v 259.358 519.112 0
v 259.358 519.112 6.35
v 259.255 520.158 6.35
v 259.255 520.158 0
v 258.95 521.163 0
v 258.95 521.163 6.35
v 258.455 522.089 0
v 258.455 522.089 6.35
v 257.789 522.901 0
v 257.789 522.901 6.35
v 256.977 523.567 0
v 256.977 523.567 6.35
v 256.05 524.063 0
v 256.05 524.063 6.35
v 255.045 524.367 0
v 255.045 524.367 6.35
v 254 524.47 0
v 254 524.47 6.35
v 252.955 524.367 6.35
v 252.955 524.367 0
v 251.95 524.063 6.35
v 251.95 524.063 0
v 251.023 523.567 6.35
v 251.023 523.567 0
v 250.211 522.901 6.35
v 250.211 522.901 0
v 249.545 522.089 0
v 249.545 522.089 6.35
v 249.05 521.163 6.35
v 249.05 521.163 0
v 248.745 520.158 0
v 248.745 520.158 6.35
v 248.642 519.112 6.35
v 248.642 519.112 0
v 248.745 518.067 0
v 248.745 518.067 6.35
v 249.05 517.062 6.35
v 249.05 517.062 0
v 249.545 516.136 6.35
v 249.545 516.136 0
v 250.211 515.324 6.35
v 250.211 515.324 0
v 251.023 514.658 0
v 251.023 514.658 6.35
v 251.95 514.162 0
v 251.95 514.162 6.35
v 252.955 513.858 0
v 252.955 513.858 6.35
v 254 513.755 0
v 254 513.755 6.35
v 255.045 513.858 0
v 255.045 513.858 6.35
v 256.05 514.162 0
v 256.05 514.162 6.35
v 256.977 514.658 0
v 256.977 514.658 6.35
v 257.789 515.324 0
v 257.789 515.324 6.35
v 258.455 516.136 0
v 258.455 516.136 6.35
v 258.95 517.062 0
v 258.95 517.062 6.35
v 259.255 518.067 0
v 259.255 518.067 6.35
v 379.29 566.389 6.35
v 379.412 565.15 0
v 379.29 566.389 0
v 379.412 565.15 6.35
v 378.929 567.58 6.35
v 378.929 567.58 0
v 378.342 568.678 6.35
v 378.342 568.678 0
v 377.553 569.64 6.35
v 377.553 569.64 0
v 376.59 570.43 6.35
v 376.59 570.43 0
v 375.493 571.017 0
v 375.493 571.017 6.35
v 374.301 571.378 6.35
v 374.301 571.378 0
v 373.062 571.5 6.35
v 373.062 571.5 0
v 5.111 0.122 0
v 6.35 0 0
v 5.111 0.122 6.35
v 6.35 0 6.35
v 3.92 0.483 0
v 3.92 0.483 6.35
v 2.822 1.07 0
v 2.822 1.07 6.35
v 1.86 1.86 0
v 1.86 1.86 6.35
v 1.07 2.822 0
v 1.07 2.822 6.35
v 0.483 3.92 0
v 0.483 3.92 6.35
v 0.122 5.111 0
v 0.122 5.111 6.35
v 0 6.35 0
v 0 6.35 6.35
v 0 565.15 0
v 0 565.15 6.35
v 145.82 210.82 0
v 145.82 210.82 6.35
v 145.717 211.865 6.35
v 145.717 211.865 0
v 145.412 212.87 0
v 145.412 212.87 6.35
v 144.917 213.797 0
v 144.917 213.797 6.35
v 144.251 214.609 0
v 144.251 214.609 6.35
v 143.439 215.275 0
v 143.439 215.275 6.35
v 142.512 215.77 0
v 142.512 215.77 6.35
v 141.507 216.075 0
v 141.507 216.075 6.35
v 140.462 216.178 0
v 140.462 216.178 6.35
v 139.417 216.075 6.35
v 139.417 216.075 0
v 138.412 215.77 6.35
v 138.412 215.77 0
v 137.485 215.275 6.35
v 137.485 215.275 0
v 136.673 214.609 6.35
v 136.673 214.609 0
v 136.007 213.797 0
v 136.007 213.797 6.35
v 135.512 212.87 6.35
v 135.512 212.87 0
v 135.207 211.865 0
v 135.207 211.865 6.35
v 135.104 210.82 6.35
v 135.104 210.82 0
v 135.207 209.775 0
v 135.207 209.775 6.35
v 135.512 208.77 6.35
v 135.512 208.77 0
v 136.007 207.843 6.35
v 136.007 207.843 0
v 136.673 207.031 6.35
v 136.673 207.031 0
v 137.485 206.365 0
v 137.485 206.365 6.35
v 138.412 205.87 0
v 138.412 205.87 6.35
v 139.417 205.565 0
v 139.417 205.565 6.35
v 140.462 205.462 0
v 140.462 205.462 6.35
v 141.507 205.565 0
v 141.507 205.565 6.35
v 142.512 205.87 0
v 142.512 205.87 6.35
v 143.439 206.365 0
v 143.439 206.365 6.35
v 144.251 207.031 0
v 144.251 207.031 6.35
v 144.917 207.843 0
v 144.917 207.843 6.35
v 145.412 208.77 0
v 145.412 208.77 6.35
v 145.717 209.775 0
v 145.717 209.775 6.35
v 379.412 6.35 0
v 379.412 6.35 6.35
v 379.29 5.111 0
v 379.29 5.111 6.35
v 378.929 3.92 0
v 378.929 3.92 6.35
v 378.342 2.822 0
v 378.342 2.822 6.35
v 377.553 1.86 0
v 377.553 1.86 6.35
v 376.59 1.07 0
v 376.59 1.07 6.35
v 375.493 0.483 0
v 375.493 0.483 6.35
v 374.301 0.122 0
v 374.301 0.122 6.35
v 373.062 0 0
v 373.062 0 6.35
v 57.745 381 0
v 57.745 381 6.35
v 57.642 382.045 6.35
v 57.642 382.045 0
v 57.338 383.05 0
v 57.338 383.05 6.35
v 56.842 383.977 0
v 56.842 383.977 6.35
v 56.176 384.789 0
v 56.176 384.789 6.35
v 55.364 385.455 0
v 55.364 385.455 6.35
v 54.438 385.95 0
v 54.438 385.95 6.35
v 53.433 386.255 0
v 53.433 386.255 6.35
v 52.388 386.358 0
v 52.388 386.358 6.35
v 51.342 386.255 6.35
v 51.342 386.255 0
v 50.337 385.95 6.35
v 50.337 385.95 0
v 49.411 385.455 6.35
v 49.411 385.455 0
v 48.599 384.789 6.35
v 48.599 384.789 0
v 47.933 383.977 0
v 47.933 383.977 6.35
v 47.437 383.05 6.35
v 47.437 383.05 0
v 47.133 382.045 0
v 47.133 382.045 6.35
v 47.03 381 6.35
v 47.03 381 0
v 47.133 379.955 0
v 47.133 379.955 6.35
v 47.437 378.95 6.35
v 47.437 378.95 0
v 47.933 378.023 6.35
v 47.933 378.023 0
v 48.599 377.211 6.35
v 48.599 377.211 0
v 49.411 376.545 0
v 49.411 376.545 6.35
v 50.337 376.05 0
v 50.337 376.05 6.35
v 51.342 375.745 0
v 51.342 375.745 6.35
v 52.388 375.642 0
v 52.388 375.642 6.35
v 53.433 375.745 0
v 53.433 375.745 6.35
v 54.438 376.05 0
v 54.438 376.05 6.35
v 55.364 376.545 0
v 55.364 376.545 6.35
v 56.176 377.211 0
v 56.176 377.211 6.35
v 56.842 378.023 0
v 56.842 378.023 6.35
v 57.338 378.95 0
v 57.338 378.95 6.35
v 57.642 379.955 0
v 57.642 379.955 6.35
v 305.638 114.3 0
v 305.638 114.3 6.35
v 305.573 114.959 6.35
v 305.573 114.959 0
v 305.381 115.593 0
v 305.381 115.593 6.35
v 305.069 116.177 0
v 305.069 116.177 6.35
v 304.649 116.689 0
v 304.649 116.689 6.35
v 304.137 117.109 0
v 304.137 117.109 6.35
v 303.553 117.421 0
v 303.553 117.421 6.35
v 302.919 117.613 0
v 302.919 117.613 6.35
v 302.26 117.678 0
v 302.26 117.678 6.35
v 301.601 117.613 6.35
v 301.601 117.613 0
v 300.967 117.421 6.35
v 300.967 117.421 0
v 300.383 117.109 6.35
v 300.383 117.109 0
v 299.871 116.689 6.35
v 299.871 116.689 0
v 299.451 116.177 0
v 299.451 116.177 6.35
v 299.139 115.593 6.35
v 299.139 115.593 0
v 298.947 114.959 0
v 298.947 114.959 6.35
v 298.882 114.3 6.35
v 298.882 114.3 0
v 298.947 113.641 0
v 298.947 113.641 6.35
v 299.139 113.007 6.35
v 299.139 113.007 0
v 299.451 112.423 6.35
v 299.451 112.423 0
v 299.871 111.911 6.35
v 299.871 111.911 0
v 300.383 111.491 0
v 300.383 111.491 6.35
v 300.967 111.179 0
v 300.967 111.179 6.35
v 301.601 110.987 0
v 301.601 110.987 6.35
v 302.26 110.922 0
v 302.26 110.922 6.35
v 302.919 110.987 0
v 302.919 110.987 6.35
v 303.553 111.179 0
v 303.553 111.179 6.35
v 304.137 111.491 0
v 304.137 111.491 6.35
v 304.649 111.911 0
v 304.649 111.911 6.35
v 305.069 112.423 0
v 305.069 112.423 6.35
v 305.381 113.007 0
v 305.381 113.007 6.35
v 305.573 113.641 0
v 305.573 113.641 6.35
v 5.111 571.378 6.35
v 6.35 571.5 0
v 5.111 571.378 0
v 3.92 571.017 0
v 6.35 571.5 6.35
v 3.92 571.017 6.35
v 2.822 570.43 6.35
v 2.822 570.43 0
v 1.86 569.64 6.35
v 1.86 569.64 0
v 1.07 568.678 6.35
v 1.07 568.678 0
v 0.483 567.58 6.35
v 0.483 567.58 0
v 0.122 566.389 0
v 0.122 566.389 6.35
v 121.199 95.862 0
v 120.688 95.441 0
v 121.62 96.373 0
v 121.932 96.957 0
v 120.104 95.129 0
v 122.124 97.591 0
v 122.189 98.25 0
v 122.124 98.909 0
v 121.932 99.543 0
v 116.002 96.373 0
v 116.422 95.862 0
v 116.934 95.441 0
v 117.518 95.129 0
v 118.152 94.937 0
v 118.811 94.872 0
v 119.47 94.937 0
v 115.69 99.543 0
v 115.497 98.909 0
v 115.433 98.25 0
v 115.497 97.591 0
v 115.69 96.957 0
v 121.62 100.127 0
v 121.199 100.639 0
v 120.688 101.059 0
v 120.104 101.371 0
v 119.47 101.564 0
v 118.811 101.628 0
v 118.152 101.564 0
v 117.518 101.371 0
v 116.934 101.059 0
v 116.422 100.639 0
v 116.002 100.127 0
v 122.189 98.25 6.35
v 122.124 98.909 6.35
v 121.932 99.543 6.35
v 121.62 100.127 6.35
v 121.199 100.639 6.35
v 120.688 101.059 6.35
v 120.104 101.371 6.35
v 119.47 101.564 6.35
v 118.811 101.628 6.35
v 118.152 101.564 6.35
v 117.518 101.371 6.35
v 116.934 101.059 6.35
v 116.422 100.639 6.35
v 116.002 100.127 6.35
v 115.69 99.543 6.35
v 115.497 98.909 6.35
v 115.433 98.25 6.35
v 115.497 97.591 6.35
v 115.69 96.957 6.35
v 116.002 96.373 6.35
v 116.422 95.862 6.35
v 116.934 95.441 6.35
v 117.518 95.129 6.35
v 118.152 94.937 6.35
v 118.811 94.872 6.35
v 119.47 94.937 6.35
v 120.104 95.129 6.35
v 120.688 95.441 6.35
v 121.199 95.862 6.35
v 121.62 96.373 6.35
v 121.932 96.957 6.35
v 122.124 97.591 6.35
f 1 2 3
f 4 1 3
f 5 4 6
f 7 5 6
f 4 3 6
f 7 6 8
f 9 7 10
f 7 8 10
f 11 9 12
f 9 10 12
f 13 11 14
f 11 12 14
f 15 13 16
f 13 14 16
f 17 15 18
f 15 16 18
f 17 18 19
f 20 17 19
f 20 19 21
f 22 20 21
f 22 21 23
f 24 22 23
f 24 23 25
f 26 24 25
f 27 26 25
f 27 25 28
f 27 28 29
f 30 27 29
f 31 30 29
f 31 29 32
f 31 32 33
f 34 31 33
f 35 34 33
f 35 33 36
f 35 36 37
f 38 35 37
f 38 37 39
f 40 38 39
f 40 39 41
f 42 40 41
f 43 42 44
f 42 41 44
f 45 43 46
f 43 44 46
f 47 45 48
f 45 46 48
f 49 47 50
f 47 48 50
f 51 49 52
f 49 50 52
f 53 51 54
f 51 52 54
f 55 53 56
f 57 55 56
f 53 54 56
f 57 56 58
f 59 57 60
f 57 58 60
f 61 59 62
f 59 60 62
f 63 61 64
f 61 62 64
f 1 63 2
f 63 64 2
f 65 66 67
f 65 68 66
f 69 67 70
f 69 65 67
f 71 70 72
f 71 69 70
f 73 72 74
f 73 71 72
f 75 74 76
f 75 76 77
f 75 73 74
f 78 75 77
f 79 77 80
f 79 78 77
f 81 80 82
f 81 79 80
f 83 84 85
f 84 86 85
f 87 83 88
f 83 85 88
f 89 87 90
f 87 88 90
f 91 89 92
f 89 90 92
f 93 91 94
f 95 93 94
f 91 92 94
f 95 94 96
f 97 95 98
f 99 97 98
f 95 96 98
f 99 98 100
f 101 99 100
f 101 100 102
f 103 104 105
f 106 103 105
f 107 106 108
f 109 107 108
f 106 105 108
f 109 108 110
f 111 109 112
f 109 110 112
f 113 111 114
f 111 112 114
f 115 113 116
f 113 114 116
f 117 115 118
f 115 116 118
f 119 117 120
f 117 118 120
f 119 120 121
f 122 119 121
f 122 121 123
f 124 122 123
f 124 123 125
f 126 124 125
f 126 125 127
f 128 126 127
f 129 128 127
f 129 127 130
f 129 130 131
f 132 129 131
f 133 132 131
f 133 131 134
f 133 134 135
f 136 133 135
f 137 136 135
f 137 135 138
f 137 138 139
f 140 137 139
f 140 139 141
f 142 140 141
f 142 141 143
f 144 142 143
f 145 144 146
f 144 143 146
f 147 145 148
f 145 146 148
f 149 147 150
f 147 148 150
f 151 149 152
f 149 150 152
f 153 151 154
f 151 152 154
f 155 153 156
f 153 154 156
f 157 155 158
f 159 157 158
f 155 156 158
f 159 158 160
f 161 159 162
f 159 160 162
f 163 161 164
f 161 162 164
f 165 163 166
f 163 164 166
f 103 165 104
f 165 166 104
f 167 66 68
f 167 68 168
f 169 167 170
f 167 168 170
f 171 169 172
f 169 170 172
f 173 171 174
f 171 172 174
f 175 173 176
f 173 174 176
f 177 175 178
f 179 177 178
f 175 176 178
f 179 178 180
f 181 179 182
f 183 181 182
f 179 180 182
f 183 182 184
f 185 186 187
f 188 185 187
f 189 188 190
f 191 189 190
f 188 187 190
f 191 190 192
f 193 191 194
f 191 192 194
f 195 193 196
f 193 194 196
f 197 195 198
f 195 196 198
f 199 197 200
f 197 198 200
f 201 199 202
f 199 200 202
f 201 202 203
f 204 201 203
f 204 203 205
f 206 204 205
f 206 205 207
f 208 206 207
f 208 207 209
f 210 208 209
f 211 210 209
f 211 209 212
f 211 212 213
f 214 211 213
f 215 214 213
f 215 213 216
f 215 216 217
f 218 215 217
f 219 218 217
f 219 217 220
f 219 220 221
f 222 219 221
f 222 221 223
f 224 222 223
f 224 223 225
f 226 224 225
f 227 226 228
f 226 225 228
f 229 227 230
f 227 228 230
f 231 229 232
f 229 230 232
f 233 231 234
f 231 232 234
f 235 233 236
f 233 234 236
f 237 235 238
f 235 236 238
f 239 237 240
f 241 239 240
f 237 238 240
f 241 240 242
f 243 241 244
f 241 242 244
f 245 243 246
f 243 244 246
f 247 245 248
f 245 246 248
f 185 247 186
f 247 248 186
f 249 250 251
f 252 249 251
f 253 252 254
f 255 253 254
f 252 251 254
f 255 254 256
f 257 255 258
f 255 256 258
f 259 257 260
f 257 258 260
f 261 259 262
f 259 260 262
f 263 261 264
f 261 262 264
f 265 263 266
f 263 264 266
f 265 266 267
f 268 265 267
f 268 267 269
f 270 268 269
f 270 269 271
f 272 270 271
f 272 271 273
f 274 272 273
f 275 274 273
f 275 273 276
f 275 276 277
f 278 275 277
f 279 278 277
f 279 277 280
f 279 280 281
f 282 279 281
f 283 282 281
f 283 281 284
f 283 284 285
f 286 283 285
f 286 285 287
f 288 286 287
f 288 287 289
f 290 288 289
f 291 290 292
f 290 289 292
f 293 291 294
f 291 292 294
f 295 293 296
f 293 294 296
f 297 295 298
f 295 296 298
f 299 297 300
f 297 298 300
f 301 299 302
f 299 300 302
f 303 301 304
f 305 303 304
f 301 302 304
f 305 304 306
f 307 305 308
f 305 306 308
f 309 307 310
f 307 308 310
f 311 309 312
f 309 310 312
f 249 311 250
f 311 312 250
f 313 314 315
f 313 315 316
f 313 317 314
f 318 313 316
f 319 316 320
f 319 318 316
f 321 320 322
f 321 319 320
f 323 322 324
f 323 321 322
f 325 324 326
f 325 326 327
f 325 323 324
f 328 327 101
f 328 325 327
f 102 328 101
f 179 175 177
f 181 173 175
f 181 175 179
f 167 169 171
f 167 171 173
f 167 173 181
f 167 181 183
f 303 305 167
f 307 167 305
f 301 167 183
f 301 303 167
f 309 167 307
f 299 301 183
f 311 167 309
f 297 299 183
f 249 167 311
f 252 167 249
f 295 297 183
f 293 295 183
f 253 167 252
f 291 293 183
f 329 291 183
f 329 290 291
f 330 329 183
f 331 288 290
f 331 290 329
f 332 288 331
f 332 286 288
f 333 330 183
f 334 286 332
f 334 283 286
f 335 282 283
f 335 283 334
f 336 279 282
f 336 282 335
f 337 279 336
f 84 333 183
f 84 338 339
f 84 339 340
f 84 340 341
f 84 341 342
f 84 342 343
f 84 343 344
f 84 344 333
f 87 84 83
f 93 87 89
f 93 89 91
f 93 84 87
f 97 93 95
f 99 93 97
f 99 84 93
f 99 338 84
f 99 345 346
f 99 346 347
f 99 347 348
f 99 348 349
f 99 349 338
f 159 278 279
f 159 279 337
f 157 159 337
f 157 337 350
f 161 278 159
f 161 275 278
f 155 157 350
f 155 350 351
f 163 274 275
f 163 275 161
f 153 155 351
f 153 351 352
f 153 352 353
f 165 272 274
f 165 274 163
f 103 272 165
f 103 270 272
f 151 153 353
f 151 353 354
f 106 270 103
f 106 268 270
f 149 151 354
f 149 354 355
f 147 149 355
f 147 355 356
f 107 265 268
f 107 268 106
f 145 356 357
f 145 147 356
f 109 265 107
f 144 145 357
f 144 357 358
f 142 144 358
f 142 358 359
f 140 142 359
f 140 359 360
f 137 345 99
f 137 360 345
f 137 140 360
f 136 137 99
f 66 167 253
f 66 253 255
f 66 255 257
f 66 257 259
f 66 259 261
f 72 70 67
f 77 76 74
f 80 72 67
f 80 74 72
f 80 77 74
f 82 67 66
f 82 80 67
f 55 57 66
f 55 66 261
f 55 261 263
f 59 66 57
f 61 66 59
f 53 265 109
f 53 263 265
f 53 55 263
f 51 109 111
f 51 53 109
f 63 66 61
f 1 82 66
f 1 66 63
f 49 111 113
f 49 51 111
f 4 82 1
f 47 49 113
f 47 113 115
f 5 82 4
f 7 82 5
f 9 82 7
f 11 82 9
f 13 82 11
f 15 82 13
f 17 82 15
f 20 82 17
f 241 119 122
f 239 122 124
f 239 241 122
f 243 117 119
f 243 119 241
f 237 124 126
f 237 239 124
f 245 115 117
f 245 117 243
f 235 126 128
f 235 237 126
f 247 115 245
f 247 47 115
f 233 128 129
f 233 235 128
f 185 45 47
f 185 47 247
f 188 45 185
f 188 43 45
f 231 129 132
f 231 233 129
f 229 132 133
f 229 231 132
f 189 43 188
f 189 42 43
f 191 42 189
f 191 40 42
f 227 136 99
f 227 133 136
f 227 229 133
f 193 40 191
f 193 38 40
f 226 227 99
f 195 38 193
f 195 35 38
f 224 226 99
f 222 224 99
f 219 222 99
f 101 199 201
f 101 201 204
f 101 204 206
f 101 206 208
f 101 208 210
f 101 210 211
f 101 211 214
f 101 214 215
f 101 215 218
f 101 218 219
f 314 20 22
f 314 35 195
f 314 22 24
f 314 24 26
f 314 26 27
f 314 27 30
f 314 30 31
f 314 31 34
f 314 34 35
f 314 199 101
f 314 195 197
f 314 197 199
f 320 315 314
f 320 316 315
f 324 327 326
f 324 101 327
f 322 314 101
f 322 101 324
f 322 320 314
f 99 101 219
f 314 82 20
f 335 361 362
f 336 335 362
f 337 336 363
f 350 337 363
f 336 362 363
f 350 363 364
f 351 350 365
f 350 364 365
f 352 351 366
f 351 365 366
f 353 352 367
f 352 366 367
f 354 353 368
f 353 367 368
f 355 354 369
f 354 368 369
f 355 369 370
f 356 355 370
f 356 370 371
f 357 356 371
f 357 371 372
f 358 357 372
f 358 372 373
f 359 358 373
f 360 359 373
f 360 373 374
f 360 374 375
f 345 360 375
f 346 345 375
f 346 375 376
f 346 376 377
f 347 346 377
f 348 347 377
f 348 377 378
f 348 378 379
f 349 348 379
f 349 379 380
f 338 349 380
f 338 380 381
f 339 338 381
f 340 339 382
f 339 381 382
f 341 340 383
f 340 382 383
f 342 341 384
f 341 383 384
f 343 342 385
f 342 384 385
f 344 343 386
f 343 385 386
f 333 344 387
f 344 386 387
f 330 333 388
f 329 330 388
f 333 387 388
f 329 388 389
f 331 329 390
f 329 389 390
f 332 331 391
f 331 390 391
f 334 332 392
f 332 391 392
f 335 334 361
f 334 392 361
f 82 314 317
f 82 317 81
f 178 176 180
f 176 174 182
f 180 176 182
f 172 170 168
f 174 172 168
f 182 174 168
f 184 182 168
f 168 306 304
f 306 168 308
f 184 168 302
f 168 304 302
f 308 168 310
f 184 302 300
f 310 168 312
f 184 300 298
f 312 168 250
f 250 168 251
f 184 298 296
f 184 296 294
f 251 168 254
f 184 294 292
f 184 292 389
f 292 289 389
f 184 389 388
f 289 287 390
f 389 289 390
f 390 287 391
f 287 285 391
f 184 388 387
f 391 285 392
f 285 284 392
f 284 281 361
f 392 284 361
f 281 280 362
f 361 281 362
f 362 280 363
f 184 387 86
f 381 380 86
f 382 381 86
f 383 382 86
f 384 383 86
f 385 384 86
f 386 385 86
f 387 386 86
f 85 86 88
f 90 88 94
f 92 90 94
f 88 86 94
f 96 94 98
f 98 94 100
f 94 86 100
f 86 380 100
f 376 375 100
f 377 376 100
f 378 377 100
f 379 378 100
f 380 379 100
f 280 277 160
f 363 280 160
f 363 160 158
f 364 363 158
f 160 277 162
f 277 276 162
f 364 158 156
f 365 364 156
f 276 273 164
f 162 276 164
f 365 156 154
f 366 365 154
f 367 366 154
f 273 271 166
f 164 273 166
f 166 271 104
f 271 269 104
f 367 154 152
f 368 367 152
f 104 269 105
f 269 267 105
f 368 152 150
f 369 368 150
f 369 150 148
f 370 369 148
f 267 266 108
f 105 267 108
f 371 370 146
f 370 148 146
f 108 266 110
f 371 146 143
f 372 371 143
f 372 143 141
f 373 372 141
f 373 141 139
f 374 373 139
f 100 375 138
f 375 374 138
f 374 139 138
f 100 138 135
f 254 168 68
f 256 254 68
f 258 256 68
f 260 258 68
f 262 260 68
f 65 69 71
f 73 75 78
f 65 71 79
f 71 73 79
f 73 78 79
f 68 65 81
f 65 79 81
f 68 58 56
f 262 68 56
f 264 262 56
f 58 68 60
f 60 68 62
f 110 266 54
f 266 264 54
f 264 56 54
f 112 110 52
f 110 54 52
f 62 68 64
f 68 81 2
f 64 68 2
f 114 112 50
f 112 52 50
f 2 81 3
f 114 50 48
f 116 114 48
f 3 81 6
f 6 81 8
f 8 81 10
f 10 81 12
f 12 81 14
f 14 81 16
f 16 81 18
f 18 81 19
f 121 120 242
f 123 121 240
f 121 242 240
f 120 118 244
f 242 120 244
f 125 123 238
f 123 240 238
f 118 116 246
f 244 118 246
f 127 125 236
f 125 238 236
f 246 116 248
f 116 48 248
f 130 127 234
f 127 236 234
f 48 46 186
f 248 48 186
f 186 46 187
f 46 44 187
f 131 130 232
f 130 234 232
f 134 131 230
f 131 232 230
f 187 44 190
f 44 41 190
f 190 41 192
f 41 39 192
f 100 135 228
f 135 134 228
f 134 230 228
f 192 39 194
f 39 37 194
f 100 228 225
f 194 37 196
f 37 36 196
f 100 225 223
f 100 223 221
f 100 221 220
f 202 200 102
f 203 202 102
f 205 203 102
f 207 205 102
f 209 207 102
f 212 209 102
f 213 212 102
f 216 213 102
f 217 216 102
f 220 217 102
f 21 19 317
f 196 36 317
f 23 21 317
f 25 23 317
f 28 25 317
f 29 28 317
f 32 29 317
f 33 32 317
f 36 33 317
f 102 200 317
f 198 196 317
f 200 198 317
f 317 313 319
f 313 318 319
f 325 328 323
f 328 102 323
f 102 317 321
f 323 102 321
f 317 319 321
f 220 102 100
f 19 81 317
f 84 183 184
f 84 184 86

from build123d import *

# Parameters (mm, degrees)
BOSS_EXTRUDE1_DEPTH              = 6.35
FILLET1_R                        = 3.175
FILLET2_R                        = 44.45
F_1_4_CLEARANCE_HOLE1_D          = 6.7564
SKETCH4_W                        = 100.0125
SKETCH4_H                        = 155.575
CUT_EXTRUDE1_DEPTH               = 7.35
F_27_64_0_42188_DIAMETER_HOLE1_D = 10.715752
FILLET3_R                        = 6.35


with BuildPart() as part:
    # Sketch1 → Boss-Extrude1 (new body)
    with BuildSketch(Plane.XY):
        Polygon((0, 0), (0, 571.5), (379.4125, 571.5), (379.4125, 466.725), (479.425, 466.725), (479.425, 355.6), (428.625, 355.6), (428.625, 403.225), (379.4125, 403.225), (379.4125, 0), align=None)
    extrude(amount=BOSS_EXTRUDE1_DEPTH)

    # Fillet1
    fillet1_edges = [part.edges().sort_by_distance(p)[0] for p in [
        (428.625, 403.225, 3.175),
        (379.4125, 403.225, 3.175),
    ]]
    fillet(fillet1_edges, radius=FILLET1_R)

    # Fillet2
    fillet2_edges = [part.edges().sort_by_distance(p)[0] for p in [
        (379.4125, 466.725, 3.175),
        (479.425, 466.725, 3.175),
    ]]
    fillet(fillet2_edges, radius=FILLET2_R)

    # 1/4 Clearance Hole1 (through all)
    with Locations(Plane(origin=(0, 0, 0), x_dir=(-1, 0, 0), z_dir=(0, 0, -1))):
        with Locations((-118.810746346, 98.250269973), (-302.26, 114.3)):
            Hole(F_1_4_CLEARANCE_HOLE1_D / 2)

    # Sketch4 → Cut-Extrude1 (cut, through all)
    with BuildSketch(Plane(origin=(0, 0, 0), x_dir=(-1, 0, 0), z_dir=(0, 0, -1))):
        with Locations((-429.41875, 433.3875)):
            Rectangle(SKETCH4_W, SKETCH4_H)
    extrude(amount=-CUT_EXTRUDE1_DEPTH, mode=Mode.SUBTRACT)

    # 27/64 (0.42188) Diameter Hole1 (through all)
    with Locations(Plane(origin=(0, 0, 0), x_dir=(-1, 0, 0), z_dir=(0, 0, -1))):
        with Locations((-254, 519.1125), (-52.3875, 381), (-140.462, 210.82)):
            Hole(F_27_64_0_42188_DIAMETER_HOLE1_D / 2)

    # Fillet3
    fillet3_edges = [part.edges().sort_by_distance(p)[0] for p in [
        (0, 0, 3.175),
        (0, 571.5, 3.175),
        (379.4125, 571.5, 3.175),
        (379.4125, 0, 3.175),
    ]]
    fillet(fillet3_edges, radius=FILLET3_R)


solid = part.part
